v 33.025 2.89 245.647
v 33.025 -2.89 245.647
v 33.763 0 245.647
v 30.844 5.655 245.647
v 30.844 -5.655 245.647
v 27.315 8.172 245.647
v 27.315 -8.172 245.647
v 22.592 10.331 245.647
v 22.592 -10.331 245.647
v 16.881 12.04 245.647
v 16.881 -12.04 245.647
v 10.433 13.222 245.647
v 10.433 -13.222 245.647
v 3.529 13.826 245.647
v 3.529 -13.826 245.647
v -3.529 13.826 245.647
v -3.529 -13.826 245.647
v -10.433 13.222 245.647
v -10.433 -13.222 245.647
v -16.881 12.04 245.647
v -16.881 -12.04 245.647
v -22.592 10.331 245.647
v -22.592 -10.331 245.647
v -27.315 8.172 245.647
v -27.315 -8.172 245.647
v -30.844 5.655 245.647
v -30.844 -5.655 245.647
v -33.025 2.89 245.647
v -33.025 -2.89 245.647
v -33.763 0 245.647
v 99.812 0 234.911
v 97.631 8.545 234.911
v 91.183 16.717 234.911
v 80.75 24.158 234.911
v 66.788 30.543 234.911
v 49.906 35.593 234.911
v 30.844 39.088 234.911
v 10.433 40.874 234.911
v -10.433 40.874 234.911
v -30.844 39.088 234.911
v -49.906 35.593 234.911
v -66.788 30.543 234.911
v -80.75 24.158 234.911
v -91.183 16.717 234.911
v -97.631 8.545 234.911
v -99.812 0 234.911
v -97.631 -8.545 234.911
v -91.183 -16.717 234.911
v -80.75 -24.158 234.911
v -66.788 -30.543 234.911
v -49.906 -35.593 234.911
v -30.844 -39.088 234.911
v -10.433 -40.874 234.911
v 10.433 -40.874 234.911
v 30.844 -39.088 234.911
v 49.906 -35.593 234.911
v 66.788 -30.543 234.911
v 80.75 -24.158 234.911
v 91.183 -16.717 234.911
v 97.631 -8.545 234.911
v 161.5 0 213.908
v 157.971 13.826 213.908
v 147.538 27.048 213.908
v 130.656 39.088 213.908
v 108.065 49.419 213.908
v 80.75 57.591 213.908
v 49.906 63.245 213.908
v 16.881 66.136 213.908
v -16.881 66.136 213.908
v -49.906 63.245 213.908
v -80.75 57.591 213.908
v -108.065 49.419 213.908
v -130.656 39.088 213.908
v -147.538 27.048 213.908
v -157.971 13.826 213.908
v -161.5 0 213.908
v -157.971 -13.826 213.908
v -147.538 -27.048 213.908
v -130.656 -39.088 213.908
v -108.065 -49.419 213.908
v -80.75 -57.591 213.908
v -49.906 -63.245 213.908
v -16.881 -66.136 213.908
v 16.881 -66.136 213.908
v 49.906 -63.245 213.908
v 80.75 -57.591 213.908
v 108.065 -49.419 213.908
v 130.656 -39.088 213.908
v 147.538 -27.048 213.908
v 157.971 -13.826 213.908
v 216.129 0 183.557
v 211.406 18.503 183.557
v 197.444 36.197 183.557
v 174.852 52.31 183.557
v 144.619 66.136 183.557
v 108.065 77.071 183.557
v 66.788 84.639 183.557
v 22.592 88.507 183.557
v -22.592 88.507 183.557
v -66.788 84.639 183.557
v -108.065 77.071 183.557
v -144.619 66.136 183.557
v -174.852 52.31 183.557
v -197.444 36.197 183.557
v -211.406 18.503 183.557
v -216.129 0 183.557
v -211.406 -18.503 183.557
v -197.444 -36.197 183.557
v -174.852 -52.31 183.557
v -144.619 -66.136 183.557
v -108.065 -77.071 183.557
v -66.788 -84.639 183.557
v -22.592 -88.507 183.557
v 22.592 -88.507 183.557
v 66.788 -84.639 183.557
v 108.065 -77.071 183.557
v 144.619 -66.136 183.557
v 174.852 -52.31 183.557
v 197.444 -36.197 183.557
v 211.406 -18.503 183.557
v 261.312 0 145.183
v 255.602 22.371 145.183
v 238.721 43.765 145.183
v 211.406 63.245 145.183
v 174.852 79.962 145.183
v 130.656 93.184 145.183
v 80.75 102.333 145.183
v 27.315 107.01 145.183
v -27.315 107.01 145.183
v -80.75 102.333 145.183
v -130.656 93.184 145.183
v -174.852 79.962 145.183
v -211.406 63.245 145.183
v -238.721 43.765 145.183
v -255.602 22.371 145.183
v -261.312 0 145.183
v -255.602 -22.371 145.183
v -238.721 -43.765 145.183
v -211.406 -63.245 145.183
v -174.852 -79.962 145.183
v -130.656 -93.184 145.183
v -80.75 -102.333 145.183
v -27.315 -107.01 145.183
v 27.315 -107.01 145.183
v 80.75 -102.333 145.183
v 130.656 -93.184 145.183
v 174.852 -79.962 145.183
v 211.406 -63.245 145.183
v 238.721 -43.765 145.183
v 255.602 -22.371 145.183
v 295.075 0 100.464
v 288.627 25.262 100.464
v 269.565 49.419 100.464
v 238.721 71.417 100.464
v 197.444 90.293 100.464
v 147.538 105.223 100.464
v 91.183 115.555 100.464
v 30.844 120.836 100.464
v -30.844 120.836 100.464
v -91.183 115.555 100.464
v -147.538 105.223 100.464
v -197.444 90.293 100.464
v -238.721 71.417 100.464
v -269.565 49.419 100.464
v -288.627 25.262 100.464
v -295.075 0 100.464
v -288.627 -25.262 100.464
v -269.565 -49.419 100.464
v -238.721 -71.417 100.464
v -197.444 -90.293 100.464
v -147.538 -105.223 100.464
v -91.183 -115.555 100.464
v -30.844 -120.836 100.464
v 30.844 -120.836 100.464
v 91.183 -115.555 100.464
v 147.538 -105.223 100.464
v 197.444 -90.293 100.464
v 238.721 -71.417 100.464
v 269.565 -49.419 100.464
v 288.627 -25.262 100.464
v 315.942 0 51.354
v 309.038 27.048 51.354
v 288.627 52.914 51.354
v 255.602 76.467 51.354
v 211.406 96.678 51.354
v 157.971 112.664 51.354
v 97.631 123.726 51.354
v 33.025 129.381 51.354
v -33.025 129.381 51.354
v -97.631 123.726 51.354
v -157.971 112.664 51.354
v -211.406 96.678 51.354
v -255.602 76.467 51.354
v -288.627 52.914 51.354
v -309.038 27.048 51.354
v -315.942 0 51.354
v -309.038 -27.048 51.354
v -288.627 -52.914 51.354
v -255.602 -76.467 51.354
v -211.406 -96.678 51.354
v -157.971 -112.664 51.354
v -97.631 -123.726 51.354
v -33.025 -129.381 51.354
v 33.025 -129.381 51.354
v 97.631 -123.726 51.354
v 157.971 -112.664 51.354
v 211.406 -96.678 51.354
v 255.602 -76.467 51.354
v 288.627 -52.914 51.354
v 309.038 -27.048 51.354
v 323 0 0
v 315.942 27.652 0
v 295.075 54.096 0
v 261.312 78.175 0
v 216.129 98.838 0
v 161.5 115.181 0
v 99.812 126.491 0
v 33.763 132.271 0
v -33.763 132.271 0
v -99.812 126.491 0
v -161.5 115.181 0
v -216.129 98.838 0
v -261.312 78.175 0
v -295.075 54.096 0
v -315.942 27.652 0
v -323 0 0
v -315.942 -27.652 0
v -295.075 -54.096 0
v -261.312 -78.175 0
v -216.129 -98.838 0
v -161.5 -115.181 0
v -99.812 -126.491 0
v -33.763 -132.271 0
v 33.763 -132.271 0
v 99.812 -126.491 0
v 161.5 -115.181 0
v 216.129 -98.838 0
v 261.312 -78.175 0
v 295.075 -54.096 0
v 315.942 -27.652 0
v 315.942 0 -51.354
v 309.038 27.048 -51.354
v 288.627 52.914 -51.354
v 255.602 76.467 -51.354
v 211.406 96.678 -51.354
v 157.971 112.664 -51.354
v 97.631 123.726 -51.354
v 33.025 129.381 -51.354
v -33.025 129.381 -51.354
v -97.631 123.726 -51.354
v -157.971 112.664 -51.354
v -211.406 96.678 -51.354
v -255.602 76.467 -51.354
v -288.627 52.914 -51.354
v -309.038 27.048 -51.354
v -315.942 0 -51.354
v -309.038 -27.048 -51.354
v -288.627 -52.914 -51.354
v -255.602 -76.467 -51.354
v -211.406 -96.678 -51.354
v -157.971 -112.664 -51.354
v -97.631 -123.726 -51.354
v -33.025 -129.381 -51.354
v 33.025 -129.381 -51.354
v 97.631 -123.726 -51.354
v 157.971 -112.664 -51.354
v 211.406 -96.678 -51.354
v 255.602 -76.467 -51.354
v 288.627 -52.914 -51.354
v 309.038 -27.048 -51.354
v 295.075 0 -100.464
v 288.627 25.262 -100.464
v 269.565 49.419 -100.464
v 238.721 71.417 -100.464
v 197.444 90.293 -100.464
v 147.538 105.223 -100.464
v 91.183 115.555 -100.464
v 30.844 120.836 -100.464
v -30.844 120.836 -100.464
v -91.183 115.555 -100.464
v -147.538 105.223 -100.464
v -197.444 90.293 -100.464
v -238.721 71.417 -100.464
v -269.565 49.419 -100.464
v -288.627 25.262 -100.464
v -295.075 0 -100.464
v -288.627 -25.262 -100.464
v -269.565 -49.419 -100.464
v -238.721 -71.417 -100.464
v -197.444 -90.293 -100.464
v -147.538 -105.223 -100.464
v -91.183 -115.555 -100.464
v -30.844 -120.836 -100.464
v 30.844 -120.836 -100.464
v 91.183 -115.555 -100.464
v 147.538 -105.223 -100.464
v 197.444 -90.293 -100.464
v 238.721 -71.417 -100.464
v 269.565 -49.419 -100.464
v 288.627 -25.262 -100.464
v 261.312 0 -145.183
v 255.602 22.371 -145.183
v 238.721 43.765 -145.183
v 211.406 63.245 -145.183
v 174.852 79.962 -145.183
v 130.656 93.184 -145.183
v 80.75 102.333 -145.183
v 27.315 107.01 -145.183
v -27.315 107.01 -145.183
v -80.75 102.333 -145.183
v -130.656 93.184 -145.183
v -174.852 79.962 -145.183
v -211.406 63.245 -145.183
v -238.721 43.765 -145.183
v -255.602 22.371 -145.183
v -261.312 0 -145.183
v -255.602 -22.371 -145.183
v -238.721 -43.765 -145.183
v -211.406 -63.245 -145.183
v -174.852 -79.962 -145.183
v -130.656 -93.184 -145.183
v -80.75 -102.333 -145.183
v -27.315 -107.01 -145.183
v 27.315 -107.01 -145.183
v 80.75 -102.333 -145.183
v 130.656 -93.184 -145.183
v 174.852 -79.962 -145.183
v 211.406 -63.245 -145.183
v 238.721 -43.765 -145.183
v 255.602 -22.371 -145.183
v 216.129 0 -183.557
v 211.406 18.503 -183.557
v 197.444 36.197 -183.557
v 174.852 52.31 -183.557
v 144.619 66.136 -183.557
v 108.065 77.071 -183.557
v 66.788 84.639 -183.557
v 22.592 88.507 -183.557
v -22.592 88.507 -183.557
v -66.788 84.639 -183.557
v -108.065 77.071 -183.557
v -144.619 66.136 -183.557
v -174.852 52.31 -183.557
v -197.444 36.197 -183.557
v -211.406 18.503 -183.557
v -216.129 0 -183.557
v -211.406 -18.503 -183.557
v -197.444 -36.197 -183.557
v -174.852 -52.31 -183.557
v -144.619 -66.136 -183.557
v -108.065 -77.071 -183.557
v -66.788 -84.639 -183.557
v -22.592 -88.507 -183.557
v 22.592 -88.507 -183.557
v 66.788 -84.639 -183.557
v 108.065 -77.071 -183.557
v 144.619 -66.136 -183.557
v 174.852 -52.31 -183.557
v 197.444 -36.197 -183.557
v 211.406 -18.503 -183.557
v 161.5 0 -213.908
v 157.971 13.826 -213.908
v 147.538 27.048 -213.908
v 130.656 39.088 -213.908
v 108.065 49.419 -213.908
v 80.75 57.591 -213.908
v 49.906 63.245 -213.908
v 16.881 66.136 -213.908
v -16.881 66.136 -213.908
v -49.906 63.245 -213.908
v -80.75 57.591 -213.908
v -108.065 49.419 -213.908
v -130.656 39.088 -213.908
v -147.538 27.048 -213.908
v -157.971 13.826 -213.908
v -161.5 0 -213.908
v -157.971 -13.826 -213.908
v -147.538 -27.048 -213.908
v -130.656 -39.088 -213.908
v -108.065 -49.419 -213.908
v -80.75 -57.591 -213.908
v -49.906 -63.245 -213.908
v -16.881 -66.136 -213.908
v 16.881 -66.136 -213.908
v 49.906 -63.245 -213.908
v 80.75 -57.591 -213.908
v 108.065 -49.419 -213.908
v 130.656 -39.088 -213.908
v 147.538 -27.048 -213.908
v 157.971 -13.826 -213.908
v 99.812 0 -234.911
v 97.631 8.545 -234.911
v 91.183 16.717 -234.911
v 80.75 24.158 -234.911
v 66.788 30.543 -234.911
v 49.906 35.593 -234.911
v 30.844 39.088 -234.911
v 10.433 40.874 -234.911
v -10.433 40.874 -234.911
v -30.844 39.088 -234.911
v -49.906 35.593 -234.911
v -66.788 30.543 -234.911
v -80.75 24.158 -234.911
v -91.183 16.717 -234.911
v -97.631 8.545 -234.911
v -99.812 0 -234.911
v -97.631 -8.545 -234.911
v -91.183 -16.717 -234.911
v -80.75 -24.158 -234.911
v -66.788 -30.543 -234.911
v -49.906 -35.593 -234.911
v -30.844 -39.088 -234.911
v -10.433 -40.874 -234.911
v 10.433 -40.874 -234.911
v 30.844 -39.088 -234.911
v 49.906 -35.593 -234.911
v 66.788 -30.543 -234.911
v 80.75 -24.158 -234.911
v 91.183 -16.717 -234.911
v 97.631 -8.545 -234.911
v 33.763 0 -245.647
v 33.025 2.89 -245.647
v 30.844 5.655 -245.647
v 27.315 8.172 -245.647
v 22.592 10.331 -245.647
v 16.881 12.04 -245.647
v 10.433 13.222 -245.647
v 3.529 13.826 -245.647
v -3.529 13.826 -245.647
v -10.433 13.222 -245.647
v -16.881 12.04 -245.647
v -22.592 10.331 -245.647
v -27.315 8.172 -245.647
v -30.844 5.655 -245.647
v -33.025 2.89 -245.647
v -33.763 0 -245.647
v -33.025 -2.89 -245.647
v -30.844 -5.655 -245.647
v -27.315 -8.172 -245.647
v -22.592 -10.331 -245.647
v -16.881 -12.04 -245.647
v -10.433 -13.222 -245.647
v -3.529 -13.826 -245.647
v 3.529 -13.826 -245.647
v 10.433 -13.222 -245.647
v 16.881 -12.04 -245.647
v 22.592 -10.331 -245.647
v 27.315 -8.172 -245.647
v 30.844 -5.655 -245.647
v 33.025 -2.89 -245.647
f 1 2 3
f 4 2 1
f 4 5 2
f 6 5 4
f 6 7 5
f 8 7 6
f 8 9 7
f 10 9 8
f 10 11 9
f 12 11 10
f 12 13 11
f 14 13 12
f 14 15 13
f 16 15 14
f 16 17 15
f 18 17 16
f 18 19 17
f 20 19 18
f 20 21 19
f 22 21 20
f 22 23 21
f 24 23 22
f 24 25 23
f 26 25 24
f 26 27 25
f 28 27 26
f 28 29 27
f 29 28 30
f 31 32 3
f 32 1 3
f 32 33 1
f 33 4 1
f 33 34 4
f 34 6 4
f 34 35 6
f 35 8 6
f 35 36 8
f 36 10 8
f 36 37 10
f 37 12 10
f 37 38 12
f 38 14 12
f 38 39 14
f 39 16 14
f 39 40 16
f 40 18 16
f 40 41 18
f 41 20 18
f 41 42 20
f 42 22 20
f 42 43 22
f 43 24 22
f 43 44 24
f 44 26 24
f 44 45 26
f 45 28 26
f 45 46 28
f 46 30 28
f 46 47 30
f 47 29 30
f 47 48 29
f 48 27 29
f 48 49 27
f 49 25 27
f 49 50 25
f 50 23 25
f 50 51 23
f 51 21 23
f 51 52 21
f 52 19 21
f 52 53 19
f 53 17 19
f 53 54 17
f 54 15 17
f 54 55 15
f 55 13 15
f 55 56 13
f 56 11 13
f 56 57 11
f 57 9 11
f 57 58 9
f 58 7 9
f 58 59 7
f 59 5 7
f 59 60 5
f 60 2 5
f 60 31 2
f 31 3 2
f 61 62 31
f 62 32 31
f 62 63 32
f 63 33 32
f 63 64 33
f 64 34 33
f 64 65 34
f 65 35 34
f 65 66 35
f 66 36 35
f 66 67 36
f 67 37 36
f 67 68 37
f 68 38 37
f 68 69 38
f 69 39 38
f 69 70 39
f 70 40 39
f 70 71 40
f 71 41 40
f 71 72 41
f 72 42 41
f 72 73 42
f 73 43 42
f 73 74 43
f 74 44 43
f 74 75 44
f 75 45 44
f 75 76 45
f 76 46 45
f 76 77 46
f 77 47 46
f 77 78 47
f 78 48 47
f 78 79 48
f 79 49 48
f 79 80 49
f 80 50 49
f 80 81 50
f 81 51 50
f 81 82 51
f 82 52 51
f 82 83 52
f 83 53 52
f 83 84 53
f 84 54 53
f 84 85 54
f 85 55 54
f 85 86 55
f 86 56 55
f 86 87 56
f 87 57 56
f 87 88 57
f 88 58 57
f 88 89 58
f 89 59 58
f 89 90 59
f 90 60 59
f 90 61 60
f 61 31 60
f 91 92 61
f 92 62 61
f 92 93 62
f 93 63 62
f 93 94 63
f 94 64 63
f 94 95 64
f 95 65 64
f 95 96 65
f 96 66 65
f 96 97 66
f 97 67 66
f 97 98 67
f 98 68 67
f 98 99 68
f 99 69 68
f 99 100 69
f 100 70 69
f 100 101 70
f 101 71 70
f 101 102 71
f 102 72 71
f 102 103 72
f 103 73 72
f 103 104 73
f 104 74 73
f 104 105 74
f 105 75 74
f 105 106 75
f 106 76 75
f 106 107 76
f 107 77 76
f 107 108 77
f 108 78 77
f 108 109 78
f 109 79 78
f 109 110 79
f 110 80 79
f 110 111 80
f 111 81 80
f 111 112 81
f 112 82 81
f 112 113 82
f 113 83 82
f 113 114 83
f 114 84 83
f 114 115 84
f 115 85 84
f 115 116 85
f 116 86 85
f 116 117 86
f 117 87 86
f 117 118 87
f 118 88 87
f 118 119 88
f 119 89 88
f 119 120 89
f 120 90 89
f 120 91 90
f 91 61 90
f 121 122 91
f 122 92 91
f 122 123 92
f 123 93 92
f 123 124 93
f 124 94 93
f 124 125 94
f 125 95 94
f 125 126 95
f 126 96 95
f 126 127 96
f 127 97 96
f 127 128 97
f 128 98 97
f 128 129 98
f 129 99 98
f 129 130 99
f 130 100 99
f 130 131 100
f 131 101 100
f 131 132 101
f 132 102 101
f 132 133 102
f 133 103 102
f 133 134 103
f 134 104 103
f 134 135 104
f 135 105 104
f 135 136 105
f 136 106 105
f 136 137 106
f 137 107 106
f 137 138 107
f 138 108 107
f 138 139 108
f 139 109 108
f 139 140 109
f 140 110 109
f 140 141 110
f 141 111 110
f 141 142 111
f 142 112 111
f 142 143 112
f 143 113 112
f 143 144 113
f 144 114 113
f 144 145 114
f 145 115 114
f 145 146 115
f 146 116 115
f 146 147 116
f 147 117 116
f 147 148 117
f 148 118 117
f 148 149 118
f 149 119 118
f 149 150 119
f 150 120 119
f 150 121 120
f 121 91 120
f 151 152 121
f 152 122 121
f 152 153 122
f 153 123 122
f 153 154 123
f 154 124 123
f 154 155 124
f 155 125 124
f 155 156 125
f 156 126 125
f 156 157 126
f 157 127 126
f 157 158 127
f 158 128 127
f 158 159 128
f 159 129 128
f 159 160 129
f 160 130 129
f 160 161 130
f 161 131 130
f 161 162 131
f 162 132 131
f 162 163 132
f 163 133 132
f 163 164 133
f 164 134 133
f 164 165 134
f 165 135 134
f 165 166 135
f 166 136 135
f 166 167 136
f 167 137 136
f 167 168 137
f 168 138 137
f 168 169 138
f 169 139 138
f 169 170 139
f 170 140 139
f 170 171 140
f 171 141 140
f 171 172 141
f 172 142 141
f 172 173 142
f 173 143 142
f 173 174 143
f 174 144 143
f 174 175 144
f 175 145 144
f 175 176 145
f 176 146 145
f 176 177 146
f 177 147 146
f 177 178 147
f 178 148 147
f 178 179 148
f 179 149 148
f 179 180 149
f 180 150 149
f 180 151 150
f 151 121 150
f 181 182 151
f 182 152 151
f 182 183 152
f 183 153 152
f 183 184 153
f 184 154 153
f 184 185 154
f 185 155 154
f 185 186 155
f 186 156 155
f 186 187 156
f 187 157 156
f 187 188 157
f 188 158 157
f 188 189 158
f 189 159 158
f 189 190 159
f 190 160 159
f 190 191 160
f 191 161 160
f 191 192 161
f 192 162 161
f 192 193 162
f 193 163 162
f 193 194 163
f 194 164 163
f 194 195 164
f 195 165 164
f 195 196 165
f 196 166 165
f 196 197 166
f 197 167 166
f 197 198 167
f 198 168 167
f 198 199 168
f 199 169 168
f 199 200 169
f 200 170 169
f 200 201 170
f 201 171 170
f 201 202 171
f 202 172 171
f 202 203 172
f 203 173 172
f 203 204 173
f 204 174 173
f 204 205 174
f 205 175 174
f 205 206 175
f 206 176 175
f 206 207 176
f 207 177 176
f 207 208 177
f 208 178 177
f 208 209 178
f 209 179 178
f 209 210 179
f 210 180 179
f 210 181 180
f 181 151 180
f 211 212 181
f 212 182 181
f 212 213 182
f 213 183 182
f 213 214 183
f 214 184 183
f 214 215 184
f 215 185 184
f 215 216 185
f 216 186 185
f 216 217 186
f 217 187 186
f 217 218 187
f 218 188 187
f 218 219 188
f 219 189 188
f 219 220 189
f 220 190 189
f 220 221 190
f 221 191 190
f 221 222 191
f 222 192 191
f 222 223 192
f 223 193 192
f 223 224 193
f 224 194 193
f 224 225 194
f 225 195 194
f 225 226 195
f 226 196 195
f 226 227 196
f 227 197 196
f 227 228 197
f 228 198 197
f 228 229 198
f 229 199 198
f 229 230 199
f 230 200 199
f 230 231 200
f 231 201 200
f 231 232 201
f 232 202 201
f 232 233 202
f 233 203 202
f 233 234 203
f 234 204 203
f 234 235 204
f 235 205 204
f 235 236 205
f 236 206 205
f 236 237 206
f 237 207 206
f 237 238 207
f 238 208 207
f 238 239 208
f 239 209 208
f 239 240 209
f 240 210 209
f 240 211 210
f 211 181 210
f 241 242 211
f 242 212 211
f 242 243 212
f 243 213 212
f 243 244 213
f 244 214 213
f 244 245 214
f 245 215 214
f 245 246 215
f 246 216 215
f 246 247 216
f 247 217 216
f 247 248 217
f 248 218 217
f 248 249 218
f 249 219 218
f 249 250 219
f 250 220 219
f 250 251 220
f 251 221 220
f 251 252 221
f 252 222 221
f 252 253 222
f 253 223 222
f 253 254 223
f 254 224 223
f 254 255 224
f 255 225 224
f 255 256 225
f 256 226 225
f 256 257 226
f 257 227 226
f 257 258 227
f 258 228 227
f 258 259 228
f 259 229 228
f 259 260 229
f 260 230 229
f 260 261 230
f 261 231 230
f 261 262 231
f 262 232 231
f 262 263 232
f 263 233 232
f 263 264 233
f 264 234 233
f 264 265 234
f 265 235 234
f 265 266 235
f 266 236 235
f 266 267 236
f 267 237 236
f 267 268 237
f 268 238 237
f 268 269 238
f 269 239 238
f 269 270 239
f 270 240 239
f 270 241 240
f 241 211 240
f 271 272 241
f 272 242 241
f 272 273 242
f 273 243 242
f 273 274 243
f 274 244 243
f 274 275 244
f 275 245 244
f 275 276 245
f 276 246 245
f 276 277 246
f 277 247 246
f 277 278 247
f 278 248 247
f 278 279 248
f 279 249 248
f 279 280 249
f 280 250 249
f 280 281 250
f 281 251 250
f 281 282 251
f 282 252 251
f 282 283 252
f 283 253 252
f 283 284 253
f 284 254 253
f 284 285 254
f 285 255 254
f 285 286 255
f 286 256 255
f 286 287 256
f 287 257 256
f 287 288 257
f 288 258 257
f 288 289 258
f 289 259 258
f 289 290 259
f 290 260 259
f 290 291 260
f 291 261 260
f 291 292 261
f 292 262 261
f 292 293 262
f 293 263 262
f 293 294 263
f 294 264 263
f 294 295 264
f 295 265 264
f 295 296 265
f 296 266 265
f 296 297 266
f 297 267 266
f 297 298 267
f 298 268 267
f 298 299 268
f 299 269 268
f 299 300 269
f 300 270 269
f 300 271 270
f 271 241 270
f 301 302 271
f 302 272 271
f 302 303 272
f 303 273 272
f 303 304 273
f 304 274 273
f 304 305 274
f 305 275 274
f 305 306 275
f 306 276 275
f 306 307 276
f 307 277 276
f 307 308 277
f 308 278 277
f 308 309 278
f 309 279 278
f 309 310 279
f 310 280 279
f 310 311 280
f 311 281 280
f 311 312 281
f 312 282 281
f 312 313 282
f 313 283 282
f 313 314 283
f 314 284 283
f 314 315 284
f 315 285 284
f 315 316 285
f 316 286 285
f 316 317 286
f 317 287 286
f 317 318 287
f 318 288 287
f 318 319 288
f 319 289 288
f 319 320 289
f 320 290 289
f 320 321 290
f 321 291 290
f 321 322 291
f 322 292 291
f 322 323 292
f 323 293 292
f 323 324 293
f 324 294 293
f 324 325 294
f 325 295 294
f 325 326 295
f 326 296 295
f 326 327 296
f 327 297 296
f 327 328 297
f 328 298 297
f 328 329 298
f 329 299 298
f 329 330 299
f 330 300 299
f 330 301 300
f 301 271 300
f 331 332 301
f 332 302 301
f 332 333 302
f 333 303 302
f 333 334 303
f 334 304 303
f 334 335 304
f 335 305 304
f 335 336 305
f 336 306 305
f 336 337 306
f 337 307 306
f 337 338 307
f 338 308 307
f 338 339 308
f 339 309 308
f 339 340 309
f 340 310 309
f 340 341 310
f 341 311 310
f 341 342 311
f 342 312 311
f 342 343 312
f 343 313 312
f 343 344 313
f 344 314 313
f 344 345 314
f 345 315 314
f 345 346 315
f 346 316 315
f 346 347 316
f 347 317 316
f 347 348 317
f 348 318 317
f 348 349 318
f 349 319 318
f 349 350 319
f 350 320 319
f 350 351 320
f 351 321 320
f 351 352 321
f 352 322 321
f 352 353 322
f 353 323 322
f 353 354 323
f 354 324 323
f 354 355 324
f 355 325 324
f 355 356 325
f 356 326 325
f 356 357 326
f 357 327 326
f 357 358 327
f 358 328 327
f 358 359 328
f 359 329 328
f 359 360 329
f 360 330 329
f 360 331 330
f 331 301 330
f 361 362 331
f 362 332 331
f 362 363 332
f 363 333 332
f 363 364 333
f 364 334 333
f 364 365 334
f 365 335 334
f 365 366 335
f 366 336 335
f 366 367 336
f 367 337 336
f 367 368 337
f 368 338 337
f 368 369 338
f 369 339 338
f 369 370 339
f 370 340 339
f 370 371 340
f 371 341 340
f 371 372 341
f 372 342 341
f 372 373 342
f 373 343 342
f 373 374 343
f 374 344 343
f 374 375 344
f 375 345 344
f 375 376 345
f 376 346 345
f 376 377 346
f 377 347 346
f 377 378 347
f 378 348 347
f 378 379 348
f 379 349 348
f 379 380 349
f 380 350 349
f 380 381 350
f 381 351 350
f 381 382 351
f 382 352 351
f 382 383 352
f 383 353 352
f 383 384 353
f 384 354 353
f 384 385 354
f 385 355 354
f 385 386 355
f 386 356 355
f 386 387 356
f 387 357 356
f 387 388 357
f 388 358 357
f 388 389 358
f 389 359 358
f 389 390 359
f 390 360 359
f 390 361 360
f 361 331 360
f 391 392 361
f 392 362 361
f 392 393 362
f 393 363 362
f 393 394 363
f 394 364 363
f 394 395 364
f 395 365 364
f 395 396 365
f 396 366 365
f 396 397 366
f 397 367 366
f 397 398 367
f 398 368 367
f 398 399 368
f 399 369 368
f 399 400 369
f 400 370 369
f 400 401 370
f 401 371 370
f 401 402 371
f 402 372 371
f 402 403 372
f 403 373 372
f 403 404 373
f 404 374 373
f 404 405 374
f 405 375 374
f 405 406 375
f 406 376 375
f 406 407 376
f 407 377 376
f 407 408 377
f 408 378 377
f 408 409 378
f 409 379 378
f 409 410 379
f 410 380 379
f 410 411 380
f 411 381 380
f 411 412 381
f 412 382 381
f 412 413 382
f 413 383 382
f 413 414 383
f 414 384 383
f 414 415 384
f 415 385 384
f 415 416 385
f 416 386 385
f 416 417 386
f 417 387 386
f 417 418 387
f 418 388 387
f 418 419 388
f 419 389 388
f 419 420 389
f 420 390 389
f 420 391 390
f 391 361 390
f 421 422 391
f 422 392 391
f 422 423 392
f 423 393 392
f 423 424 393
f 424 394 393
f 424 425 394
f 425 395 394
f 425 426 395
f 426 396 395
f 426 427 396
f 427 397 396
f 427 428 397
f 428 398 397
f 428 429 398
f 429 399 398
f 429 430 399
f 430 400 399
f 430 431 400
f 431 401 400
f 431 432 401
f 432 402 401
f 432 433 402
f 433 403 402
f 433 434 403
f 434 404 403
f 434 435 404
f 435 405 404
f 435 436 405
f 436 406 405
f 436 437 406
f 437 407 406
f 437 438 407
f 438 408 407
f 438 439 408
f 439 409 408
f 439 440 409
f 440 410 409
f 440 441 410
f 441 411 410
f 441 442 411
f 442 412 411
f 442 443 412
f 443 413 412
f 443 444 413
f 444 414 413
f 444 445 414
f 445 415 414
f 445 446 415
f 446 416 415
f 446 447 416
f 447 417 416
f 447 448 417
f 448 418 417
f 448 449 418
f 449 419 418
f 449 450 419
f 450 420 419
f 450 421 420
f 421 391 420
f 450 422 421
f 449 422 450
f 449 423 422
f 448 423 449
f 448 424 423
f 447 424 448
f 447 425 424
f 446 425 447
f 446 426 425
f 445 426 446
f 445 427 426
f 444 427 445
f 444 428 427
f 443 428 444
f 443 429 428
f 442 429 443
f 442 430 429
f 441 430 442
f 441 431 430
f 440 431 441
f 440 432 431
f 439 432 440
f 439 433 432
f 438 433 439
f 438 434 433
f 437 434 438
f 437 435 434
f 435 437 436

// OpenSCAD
// Generated by SolidPython 1.0.1 on 2020-07-29 00:46:52


scale(v = [17, 7, 13]) {
	sphere(r = 19);
}
/***********************************************
*********      SolidPython code:      **********
************************************************
 
# import packages: SolidPython
from solid import *
from solid.utils import *
from itertools import chain, combinations, permutations


class Resize:

    def __init__(self, scad_file):
        self.scad_file = scad_file
        #self.scad_file = import_scad(scad_file)
        # cone/cylinder param:
        self.r1 = 0
        self.r2 = 0
        self.h = 0
        # rectangular prism param:
        self.w = 0
        self.l = 0
        # ellipse param:
        self.r = 0

    # import OpenScad code (file name corresponds to shape)


    # classify shape + parameters
    def assign(self, param1, param2, param3):
        if self.scad_file == 'cone.scad':
            self.r1 = param1
            self.r2 = param2
            self.h = param3
        elif self.scad_file == 'cylinder.scad':
            self.r1 = param1
            self.r2 = param2
            self.h = param3
        elif self.scad_file == 'rectangularPrism.scad':
            self.h = param1
            self.l = param2
            self.w = param3
        else:
            self.r = param1
            self.h = param2

    # resize parameters
    def iterate(self):
        x = range(3, 20, 2)
        i = 1
        if self.scad_file == 'cone.scad':
            tempList = list(permutations(x, 2))
            for temp in tempList:
                param1 = temp[0]
                param2 = temp[1]
                filepath = 'produced_scad_files/' + 'cone' + str(param1) + '_' + str(param2) + '_' + '.scad'
                scad_render_to_file(cylinder(h=param1, r1=param2, r2=0), filepath)

        elif self.scad_file == 'cylinder.scad':
            tempList = list(permutations(x, 3))
            for temp in tempList:
                param1 = temp[0]
                param2 = temp[1]
                filepath = 'produced_scad_files/' + 'cylinder' + str(param1) + '_' + str(param2) + '_' + '.scad'
                scad_render_to_file(cylinder(h=param1, r1=param2, r2=param2), filepath)

        elif self.scad_file == 'rectangularPrism.scad':
            tempList = list(permutations(x, 3))
            for temp in tempList:
                param1 = temp[0]
                param2 = temp[1]
                param3 = temp[2]
                filepath = 'produced_scad_files/' + 'rectangularPrism' + str(param1) + '_' + str(param2) + '_' + str(
                    param3) + '.scad'
                scad_render_to_file(cube(size=(param1, param2, param3)), filepath)

        elif self.scad_file == 'ellipse.scad':
            tempList = list(permutations(x, 4))
            for temp in tempList:
                param1 = temp[0]
                param2 = temp[1]
                param3 = temp[2]
                param4 = temp[3]
                filepath = 'produced_scad_files/' + 'ellipse' + str(param1) + '_' + str(param2) + '_' + str(param3) + '_' + str(param4) + '.scad'
                scad_render_to_file(scale([param1, param2, param3])(sphere(r=param4)), filepath)

    def render_to_scadfile(self):
        scad_render_to_file(scad, 'example.scad') 
 
************************************************/
